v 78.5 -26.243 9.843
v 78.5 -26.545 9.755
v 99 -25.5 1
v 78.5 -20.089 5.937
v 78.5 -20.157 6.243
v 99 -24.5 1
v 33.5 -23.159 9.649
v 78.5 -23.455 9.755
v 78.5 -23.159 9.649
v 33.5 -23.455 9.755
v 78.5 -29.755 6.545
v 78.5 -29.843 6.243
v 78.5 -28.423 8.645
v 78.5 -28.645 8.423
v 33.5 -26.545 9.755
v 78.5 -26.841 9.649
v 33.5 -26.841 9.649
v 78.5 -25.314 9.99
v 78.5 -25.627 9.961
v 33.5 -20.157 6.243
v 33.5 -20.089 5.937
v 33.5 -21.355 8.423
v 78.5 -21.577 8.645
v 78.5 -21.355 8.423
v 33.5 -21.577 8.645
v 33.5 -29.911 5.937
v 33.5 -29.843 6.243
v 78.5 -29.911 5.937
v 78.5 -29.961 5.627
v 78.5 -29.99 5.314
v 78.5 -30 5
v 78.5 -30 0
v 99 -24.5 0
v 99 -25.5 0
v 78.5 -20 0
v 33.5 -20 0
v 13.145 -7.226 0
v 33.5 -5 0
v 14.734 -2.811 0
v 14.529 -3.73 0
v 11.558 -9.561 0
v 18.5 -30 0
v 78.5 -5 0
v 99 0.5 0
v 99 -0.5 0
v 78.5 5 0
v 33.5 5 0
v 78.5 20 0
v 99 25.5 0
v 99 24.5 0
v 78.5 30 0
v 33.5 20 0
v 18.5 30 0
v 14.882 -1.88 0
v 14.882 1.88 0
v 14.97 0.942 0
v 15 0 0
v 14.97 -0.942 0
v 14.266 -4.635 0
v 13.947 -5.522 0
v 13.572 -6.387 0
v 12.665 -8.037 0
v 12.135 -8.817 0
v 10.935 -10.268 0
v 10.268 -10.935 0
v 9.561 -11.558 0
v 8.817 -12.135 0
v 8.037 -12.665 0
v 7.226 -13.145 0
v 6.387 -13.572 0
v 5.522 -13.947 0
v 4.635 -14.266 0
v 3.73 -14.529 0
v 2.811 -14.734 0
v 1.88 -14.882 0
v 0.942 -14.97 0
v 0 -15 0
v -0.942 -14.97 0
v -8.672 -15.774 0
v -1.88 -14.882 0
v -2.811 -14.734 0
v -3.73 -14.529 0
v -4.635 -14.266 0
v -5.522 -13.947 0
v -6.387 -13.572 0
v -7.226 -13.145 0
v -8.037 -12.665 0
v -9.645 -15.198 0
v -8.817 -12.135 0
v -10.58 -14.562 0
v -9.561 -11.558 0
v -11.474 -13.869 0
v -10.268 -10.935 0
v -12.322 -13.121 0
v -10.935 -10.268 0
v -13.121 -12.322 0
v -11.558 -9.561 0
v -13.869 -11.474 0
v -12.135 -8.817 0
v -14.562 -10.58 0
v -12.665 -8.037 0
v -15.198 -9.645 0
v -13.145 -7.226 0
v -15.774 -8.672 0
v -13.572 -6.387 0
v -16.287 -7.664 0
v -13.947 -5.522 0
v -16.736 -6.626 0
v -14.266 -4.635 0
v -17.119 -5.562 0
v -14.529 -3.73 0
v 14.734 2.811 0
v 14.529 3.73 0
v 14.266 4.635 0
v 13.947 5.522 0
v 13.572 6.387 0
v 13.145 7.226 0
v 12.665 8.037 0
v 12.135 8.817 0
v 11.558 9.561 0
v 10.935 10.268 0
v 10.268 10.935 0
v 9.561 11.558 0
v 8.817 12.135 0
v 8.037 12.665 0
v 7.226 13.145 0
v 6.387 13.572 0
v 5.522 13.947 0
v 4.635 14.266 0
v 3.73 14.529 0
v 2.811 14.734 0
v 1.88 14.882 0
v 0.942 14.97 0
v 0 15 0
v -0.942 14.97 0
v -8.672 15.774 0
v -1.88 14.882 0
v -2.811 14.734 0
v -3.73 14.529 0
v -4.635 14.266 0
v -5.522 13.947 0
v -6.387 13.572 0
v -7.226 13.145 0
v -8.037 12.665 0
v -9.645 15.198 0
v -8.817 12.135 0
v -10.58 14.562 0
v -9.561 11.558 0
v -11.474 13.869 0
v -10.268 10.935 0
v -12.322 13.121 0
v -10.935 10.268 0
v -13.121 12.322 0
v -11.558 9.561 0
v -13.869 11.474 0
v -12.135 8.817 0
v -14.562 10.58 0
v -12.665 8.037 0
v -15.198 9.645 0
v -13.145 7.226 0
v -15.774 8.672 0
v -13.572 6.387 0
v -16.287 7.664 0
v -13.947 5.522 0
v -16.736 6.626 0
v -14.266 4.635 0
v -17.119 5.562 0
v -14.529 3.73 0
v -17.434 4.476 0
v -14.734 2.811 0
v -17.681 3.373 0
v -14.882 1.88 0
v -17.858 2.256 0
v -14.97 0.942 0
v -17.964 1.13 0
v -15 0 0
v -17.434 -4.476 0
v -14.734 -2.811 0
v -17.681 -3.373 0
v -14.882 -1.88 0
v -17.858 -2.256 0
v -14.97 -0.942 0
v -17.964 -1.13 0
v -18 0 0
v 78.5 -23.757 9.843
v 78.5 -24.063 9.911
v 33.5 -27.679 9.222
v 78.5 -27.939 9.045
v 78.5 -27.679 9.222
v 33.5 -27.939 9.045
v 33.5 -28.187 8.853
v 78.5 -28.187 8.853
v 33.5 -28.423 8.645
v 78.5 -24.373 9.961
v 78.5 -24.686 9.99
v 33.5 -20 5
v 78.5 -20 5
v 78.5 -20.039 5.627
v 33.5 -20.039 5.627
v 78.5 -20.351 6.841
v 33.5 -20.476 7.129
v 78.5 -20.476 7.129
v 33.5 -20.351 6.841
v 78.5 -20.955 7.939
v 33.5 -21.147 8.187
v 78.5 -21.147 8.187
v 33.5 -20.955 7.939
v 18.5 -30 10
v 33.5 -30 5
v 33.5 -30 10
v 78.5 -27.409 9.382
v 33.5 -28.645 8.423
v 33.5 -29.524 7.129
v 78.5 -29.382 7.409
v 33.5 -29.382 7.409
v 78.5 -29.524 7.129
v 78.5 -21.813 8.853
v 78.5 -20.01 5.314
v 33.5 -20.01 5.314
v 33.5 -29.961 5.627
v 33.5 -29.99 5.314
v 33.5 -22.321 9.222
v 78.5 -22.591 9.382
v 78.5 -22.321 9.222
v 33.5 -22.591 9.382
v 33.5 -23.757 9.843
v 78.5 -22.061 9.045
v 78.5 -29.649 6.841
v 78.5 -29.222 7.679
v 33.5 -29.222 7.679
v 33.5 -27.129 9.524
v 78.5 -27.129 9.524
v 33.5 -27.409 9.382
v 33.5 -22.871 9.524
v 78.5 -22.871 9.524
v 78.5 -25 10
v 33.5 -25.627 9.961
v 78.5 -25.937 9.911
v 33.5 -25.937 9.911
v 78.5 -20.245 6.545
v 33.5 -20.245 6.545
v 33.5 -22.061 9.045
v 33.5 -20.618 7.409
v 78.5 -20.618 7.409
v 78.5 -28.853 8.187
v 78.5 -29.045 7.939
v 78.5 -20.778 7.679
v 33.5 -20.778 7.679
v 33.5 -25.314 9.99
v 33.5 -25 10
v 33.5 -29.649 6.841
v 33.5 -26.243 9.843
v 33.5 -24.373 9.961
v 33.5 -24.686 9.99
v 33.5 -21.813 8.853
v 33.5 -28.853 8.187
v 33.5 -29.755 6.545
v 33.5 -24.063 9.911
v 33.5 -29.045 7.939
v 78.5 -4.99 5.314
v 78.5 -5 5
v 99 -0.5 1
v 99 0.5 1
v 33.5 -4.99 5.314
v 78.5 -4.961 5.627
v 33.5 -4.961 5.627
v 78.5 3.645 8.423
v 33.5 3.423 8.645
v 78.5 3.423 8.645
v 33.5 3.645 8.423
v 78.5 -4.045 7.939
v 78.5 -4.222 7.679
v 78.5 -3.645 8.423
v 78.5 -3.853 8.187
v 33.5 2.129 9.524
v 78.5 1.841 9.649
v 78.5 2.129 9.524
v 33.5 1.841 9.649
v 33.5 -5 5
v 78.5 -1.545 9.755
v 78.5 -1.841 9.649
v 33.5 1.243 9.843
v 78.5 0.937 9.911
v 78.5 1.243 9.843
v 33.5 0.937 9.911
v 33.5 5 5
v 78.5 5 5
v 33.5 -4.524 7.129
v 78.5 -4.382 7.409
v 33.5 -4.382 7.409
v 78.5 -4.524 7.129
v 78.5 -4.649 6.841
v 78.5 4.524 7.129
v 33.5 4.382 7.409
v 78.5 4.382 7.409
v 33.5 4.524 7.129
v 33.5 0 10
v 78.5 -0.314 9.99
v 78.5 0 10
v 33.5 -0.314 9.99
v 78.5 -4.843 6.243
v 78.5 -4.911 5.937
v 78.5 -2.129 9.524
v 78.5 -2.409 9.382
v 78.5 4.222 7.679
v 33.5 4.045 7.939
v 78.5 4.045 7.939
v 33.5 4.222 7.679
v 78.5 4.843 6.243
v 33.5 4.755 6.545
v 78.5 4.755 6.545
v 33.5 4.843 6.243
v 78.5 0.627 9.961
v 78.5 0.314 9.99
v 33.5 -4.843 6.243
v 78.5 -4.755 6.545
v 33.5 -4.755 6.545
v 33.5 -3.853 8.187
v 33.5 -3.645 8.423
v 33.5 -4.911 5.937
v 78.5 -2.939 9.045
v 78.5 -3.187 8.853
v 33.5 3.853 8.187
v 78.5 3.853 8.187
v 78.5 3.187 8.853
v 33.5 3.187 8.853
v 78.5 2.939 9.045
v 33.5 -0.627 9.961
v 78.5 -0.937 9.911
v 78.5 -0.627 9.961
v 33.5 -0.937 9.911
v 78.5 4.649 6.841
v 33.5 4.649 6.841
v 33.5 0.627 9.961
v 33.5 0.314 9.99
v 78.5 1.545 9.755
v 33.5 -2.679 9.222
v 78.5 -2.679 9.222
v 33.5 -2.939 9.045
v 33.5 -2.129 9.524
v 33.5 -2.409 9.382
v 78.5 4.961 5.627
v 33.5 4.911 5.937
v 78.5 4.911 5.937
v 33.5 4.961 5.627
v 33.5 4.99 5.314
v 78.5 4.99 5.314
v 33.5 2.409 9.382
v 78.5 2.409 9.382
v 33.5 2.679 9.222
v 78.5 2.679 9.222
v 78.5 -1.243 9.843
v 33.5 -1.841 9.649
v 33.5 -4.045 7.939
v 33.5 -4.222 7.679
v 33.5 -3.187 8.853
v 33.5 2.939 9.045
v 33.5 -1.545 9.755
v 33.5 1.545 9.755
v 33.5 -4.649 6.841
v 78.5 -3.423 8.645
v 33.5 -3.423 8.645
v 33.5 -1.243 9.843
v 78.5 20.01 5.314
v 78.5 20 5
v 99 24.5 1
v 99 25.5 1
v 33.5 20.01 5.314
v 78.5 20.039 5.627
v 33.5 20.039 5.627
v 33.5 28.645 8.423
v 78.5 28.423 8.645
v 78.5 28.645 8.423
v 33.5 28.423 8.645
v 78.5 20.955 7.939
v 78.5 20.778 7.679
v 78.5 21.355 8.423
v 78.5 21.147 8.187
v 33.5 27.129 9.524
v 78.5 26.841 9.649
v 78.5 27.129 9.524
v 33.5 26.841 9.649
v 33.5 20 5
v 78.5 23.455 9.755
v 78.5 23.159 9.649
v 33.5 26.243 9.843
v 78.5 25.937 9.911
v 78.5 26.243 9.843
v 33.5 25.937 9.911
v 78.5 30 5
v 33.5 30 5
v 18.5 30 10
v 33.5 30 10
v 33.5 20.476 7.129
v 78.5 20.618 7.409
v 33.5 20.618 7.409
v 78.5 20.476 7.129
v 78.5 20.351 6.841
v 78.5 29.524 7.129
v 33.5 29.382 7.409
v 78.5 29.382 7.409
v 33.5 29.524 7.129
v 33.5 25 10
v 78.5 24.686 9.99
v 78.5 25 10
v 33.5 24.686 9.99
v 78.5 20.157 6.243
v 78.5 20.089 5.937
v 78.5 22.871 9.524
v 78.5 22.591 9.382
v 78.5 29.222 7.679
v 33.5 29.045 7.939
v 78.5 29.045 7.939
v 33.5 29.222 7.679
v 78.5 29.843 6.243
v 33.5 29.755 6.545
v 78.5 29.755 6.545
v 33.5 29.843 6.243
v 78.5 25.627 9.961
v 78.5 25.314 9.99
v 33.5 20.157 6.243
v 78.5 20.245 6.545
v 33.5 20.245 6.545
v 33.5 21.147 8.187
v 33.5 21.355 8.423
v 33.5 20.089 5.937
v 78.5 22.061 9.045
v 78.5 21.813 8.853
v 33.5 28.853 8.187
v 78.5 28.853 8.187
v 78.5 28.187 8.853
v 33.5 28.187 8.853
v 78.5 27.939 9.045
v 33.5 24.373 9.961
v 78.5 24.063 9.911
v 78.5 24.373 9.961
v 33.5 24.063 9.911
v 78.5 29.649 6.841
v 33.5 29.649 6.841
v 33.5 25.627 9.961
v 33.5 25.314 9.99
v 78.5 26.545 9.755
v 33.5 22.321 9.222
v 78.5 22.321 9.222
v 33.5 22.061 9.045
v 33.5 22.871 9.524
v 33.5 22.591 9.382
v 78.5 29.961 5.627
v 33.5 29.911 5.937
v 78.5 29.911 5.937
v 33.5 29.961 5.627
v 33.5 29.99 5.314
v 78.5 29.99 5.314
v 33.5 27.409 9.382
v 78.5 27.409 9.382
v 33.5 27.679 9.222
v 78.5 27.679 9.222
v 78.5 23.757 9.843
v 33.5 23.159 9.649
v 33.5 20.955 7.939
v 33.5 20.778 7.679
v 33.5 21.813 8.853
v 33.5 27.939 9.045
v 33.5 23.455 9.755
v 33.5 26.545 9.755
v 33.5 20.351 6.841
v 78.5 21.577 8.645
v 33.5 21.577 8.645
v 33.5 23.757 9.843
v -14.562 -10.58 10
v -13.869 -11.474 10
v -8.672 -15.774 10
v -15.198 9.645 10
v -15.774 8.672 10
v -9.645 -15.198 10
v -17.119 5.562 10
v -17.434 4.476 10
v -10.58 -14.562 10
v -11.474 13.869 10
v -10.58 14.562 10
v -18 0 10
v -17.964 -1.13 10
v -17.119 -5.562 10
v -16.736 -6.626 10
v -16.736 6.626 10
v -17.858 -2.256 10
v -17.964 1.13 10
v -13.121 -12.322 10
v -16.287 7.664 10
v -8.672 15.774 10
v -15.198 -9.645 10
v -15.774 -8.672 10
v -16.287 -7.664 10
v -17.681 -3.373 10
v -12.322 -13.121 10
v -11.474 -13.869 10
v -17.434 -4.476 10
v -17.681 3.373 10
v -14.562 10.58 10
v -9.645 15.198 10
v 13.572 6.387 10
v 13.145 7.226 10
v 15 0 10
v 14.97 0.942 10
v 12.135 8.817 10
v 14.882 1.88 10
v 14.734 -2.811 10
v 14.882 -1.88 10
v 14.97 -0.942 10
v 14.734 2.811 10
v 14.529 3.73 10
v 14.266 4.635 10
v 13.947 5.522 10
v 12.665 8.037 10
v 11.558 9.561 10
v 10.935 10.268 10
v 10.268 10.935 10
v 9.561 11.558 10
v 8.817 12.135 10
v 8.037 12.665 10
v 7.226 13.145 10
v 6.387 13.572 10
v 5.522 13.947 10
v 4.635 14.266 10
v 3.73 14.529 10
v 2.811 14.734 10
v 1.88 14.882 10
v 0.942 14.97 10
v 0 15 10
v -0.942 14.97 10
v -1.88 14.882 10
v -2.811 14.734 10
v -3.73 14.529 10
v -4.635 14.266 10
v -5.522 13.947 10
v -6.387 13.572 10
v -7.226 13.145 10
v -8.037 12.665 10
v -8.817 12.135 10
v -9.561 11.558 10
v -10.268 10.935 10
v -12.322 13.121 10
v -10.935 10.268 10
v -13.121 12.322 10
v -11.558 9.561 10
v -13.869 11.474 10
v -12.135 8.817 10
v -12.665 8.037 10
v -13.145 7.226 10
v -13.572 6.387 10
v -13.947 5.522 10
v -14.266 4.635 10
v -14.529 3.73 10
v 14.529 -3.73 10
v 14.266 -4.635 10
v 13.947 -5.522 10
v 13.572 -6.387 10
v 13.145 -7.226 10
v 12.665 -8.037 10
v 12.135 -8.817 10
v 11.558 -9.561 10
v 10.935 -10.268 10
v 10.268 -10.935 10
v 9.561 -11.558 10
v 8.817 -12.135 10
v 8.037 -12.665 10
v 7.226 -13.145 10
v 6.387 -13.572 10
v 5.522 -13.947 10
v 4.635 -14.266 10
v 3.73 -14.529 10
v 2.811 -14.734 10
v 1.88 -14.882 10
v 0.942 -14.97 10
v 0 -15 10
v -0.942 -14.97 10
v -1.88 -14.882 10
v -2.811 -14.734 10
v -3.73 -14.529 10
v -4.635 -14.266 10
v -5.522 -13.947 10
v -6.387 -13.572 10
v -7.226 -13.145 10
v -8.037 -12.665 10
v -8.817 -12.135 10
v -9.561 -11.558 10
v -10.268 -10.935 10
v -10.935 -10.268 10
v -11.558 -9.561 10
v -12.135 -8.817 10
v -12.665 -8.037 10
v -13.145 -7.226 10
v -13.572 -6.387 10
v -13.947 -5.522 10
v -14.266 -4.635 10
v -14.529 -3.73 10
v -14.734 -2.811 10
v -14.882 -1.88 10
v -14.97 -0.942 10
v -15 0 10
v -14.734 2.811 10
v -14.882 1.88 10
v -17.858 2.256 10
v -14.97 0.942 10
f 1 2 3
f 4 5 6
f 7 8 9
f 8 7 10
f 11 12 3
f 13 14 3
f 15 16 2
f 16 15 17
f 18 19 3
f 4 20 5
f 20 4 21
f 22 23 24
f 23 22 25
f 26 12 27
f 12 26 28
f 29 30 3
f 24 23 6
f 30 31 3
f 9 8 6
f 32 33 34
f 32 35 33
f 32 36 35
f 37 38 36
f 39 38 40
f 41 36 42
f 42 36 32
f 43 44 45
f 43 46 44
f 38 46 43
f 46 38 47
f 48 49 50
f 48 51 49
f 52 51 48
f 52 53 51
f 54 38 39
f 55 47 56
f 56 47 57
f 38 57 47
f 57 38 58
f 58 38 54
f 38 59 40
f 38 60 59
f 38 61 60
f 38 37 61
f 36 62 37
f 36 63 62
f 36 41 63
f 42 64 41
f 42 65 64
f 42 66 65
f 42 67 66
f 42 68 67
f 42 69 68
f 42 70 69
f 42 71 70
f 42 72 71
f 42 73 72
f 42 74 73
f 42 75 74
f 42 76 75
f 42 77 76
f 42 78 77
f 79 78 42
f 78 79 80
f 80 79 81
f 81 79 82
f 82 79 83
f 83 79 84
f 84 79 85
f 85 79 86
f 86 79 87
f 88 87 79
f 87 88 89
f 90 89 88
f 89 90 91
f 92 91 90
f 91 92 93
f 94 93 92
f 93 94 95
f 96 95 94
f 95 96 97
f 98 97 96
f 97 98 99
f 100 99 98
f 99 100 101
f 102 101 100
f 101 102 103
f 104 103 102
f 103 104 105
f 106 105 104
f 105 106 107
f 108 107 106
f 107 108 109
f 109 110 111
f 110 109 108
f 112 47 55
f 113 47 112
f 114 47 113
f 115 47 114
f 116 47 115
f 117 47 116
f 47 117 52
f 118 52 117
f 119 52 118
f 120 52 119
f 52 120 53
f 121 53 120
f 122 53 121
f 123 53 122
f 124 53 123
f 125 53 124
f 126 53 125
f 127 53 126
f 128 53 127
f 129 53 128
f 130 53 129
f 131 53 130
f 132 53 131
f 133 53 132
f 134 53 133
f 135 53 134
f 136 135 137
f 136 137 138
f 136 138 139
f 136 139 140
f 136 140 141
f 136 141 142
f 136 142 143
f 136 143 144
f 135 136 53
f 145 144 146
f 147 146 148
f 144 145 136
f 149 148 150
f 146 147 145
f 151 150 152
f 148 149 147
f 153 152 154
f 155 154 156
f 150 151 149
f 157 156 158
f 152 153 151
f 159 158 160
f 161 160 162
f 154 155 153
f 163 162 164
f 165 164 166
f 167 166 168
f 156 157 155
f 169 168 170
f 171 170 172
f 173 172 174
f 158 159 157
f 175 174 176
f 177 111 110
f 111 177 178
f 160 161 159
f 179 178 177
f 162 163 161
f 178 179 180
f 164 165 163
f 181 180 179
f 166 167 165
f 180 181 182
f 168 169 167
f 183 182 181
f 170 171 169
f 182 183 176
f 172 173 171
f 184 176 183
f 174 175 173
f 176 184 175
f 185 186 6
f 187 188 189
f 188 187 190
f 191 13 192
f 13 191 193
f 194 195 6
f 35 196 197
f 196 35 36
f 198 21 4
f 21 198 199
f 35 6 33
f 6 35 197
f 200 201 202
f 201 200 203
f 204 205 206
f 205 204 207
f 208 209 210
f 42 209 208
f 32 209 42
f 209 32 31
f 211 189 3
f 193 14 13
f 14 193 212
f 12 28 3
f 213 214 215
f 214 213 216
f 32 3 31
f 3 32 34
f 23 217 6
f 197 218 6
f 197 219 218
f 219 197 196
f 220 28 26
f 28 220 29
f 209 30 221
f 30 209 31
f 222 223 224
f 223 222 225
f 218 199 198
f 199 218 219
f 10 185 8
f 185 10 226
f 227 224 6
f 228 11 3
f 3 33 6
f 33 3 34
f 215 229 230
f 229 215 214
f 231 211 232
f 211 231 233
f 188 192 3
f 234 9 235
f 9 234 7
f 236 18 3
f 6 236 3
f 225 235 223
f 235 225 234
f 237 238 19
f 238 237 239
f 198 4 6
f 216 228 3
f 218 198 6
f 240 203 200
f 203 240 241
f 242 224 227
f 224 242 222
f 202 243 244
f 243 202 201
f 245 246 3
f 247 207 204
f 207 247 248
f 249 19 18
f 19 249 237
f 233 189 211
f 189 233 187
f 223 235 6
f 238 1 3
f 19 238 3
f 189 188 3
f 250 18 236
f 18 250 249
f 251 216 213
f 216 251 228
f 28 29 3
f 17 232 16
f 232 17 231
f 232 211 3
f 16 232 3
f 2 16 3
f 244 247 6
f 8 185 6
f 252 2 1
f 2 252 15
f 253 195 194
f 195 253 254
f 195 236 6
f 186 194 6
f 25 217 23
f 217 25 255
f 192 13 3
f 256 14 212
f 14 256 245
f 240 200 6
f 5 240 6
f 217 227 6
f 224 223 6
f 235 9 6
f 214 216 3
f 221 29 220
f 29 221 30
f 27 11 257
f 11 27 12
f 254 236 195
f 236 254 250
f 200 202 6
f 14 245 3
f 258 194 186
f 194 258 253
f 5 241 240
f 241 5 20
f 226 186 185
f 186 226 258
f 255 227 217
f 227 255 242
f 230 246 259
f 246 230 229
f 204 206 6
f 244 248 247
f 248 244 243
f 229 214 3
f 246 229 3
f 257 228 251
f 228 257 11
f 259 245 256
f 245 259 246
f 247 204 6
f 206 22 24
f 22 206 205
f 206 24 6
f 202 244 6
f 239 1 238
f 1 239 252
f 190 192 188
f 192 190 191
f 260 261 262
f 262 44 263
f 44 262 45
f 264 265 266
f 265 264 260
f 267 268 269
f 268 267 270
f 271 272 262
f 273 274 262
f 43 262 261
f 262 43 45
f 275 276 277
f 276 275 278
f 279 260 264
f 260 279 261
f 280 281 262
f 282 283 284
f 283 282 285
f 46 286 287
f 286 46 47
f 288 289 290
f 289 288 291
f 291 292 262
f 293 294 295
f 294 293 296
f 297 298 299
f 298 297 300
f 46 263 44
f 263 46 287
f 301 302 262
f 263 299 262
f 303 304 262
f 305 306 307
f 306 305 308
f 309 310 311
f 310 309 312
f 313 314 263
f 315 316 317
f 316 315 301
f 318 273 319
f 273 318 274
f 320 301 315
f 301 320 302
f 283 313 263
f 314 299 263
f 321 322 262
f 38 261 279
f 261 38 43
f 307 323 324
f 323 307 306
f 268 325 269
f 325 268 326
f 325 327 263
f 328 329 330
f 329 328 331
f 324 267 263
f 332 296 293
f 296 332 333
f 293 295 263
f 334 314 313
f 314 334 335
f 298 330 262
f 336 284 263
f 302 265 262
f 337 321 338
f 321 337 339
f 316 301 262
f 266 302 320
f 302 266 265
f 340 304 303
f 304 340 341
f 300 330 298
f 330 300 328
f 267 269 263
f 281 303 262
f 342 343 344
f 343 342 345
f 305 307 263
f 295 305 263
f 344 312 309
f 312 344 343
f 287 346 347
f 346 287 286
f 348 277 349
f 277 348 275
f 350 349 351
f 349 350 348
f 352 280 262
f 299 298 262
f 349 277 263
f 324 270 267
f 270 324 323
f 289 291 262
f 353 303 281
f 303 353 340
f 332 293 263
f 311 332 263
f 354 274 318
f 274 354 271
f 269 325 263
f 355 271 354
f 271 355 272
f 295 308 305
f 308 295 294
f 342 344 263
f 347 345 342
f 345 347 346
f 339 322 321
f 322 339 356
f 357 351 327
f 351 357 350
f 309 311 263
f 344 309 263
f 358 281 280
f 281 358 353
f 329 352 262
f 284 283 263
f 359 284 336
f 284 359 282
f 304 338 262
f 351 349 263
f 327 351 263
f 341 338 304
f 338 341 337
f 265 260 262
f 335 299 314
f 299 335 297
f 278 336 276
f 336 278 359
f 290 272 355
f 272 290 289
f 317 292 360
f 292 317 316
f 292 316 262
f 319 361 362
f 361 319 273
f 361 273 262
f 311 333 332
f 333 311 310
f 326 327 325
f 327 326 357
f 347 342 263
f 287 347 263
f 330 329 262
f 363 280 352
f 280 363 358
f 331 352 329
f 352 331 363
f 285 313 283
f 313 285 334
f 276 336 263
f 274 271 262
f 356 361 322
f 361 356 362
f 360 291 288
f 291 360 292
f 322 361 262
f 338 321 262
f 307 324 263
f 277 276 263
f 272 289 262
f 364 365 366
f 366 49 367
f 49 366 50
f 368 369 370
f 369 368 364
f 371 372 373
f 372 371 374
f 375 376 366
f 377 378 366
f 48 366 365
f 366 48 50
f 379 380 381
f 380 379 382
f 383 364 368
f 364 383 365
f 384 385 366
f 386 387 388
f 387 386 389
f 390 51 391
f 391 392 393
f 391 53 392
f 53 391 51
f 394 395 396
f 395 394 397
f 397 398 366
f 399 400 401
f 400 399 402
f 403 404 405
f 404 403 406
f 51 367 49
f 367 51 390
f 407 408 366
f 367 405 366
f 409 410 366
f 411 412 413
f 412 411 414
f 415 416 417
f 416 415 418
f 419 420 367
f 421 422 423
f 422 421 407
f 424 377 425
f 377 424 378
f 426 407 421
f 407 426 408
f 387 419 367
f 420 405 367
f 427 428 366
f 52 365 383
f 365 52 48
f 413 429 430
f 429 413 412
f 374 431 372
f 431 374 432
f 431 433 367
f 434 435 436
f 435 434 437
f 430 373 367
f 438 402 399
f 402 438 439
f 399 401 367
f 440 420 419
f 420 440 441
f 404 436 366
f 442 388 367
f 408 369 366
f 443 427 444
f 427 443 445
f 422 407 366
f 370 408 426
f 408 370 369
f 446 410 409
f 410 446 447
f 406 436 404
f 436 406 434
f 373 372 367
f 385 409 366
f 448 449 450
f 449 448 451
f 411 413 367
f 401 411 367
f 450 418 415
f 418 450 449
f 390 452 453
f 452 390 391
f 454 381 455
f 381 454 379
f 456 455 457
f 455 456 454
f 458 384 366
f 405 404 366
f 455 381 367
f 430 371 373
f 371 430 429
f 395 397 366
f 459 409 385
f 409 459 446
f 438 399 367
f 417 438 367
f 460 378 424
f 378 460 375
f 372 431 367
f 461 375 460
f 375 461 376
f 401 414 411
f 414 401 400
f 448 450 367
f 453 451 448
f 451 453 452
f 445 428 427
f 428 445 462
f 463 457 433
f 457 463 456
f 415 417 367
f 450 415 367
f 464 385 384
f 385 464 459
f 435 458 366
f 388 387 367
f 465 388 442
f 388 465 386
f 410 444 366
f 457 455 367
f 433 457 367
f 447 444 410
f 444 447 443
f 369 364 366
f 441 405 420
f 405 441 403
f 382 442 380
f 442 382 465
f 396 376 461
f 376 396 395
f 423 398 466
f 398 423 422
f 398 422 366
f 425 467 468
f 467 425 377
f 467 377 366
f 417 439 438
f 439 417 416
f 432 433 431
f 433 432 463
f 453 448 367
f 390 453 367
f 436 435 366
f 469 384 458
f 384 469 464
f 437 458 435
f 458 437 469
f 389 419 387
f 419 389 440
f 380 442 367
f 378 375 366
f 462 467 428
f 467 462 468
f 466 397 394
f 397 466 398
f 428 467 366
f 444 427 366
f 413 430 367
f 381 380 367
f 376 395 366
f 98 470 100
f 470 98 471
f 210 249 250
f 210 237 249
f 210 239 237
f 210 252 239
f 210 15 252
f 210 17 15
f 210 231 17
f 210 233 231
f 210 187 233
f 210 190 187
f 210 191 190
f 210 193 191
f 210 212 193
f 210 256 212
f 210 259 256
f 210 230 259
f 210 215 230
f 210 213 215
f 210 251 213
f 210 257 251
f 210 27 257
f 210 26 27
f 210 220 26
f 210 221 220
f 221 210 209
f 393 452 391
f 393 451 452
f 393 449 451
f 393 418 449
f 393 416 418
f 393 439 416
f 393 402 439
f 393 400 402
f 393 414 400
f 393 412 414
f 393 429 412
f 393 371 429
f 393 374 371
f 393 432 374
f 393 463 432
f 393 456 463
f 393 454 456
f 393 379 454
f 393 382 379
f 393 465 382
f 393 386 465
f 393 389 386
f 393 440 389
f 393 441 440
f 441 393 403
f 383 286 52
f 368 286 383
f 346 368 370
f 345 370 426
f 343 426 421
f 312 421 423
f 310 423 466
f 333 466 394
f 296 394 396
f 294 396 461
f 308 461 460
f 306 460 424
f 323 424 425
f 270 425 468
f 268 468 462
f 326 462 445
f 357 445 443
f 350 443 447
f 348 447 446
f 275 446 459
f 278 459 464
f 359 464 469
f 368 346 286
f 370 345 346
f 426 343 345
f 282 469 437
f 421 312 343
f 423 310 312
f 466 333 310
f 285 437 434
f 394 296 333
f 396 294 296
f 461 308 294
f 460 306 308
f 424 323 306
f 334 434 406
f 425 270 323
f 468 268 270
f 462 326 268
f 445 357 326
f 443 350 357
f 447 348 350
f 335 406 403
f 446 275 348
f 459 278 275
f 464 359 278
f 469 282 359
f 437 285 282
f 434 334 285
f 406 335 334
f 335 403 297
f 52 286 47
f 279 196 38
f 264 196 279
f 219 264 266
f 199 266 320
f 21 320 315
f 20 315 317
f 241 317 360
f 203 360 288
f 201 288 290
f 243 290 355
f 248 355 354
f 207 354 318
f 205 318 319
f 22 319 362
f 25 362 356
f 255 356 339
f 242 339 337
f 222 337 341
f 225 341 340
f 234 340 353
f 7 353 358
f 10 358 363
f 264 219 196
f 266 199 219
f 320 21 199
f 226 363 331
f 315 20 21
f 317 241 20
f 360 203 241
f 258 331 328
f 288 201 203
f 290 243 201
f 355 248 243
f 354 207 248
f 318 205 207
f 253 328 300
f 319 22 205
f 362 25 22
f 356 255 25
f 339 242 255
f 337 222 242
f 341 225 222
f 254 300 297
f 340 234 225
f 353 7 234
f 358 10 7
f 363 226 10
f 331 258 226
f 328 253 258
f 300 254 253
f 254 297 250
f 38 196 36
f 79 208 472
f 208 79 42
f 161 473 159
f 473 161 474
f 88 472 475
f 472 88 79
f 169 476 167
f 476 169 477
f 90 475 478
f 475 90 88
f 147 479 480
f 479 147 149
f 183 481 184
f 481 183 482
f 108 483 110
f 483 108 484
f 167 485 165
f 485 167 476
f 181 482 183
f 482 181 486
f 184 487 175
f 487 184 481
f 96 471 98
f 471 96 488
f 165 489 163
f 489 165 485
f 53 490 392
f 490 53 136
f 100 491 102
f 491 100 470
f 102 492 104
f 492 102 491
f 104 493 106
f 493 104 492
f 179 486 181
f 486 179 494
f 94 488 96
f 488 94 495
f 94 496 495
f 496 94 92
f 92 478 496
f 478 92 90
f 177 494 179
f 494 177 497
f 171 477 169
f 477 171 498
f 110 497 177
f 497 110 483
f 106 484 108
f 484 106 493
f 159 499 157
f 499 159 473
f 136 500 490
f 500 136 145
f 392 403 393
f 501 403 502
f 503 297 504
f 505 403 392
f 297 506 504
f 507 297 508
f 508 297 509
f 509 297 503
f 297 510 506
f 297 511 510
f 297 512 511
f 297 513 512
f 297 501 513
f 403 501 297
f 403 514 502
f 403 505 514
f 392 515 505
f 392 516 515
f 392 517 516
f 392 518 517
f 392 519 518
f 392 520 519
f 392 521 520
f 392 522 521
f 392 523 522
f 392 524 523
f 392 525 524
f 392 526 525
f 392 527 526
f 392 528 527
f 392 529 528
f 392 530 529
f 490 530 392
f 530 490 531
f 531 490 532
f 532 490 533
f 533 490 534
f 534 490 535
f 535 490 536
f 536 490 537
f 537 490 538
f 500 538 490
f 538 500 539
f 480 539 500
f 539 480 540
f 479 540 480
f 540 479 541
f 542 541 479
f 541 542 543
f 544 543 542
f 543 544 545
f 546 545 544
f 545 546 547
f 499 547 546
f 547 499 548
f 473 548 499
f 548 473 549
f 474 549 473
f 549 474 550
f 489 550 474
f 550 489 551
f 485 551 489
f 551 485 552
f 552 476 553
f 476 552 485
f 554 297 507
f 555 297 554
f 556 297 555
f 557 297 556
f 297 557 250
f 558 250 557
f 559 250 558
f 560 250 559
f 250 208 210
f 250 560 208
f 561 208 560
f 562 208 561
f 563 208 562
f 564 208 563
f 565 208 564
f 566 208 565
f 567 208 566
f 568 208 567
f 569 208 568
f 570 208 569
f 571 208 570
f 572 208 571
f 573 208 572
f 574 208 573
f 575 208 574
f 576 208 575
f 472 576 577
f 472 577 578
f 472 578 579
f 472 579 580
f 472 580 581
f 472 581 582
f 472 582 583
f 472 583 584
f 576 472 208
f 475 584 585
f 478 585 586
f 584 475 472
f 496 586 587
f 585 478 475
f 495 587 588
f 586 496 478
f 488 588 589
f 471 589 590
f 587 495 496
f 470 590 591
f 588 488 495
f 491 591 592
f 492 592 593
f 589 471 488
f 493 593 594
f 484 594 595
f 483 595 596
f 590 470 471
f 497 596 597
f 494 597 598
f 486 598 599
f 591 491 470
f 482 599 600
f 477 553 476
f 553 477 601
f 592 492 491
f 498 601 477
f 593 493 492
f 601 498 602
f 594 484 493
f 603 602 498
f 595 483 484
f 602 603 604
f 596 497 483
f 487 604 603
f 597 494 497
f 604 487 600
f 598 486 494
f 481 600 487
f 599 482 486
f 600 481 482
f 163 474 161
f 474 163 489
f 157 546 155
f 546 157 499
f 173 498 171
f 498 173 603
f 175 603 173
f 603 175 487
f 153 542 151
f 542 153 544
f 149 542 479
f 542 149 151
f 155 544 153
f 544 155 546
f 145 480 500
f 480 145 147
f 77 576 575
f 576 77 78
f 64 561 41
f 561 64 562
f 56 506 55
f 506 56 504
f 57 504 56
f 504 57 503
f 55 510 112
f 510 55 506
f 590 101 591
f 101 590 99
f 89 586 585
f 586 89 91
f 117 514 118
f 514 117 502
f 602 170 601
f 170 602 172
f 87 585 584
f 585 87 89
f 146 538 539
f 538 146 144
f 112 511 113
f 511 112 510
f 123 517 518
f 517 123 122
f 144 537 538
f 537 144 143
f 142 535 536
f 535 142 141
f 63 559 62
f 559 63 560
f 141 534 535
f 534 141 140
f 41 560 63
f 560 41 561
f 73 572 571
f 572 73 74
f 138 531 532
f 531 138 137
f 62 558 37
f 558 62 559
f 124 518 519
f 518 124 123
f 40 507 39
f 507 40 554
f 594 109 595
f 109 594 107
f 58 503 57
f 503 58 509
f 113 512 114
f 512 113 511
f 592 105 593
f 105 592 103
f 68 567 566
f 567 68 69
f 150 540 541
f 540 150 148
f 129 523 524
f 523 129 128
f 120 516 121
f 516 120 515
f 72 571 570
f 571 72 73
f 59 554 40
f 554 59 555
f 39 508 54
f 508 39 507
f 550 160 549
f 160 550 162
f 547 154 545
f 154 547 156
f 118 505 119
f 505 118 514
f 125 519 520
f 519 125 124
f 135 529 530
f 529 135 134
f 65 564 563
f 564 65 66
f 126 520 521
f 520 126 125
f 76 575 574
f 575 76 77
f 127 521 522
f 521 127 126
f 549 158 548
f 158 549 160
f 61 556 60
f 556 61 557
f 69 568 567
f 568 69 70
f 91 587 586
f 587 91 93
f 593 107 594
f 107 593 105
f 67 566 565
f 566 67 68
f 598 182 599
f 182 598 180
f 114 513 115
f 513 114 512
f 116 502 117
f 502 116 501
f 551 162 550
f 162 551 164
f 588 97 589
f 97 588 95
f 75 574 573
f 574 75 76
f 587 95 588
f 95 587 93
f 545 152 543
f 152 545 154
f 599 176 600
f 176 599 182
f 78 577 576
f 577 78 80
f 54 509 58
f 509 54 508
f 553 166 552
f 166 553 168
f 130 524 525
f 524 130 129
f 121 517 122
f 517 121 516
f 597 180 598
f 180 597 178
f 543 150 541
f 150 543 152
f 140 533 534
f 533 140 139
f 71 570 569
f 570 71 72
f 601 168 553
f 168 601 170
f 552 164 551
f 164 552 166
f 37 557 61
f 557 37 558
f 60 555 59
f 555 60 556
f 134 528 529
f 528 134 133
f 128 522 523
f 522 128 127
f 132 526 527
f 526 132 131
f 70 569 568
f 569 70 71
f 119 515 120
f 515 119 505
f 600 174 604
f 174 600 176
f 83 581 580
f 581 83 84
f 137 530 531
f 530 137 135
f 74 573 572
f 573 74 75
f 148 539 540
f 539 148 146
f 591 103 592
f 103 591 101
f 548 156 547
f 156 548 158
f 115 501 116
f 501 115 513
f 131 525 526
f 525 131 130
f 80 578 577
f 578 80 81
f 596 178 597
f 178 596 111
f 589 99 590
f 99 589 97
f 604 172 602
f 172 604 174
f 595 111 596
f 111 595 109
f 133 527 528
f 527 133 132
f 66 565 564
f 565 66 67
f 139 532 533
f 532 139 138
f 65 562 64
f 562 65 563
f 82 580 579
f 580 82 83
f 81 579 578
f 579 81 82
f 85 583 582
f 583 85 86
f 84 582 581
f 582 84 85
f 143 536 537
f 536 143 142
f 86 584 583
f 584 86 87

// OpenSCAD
//custom rake

// diameter handle
d=30;
// thickness of handle holder
t=3;
// height of handle holder
h=10;

// number of teeth +1
n=2;
// radius of teeth
r=5;
//spacing of teeth
s=15;
//length of teeth
l=50;
// pointiness
p=20;


//calls

translate([12,-n/2*(2*r+s),0])rake();
handleholder();

module handleholder(){
difference(){
hull(){
translate([d*2/3+t*2,0,h/2])cube([d/2,n*(2*r+s)+2*r,h],center=true); //manifold
translate([0,0,h/2])cylinder(h,d/2+t,d/2+t,center=true,$fn=100);
		}
	translate([0,0,h/2])cylinder(h+1,d/2,d/2,center=true,$fn=100);
			}
				}
					


module rake(){
	for(i=[0:n]) {
hull(){
union(){
		translate([l/2+(d+t)/2,i*(s+2*r),r])rotate([0,90,0])cylinder(l,r,r,center=true,$fn=100);
		translate([l/2+(d+t)/2,i*(s+2*r),r/2])cube([l,r*2,r], center=true);
}
translate([p+l+(d+t)/2,i*(s+2*r),0.5])cube([1,1,1], center=true);
				}
	
			}
}


